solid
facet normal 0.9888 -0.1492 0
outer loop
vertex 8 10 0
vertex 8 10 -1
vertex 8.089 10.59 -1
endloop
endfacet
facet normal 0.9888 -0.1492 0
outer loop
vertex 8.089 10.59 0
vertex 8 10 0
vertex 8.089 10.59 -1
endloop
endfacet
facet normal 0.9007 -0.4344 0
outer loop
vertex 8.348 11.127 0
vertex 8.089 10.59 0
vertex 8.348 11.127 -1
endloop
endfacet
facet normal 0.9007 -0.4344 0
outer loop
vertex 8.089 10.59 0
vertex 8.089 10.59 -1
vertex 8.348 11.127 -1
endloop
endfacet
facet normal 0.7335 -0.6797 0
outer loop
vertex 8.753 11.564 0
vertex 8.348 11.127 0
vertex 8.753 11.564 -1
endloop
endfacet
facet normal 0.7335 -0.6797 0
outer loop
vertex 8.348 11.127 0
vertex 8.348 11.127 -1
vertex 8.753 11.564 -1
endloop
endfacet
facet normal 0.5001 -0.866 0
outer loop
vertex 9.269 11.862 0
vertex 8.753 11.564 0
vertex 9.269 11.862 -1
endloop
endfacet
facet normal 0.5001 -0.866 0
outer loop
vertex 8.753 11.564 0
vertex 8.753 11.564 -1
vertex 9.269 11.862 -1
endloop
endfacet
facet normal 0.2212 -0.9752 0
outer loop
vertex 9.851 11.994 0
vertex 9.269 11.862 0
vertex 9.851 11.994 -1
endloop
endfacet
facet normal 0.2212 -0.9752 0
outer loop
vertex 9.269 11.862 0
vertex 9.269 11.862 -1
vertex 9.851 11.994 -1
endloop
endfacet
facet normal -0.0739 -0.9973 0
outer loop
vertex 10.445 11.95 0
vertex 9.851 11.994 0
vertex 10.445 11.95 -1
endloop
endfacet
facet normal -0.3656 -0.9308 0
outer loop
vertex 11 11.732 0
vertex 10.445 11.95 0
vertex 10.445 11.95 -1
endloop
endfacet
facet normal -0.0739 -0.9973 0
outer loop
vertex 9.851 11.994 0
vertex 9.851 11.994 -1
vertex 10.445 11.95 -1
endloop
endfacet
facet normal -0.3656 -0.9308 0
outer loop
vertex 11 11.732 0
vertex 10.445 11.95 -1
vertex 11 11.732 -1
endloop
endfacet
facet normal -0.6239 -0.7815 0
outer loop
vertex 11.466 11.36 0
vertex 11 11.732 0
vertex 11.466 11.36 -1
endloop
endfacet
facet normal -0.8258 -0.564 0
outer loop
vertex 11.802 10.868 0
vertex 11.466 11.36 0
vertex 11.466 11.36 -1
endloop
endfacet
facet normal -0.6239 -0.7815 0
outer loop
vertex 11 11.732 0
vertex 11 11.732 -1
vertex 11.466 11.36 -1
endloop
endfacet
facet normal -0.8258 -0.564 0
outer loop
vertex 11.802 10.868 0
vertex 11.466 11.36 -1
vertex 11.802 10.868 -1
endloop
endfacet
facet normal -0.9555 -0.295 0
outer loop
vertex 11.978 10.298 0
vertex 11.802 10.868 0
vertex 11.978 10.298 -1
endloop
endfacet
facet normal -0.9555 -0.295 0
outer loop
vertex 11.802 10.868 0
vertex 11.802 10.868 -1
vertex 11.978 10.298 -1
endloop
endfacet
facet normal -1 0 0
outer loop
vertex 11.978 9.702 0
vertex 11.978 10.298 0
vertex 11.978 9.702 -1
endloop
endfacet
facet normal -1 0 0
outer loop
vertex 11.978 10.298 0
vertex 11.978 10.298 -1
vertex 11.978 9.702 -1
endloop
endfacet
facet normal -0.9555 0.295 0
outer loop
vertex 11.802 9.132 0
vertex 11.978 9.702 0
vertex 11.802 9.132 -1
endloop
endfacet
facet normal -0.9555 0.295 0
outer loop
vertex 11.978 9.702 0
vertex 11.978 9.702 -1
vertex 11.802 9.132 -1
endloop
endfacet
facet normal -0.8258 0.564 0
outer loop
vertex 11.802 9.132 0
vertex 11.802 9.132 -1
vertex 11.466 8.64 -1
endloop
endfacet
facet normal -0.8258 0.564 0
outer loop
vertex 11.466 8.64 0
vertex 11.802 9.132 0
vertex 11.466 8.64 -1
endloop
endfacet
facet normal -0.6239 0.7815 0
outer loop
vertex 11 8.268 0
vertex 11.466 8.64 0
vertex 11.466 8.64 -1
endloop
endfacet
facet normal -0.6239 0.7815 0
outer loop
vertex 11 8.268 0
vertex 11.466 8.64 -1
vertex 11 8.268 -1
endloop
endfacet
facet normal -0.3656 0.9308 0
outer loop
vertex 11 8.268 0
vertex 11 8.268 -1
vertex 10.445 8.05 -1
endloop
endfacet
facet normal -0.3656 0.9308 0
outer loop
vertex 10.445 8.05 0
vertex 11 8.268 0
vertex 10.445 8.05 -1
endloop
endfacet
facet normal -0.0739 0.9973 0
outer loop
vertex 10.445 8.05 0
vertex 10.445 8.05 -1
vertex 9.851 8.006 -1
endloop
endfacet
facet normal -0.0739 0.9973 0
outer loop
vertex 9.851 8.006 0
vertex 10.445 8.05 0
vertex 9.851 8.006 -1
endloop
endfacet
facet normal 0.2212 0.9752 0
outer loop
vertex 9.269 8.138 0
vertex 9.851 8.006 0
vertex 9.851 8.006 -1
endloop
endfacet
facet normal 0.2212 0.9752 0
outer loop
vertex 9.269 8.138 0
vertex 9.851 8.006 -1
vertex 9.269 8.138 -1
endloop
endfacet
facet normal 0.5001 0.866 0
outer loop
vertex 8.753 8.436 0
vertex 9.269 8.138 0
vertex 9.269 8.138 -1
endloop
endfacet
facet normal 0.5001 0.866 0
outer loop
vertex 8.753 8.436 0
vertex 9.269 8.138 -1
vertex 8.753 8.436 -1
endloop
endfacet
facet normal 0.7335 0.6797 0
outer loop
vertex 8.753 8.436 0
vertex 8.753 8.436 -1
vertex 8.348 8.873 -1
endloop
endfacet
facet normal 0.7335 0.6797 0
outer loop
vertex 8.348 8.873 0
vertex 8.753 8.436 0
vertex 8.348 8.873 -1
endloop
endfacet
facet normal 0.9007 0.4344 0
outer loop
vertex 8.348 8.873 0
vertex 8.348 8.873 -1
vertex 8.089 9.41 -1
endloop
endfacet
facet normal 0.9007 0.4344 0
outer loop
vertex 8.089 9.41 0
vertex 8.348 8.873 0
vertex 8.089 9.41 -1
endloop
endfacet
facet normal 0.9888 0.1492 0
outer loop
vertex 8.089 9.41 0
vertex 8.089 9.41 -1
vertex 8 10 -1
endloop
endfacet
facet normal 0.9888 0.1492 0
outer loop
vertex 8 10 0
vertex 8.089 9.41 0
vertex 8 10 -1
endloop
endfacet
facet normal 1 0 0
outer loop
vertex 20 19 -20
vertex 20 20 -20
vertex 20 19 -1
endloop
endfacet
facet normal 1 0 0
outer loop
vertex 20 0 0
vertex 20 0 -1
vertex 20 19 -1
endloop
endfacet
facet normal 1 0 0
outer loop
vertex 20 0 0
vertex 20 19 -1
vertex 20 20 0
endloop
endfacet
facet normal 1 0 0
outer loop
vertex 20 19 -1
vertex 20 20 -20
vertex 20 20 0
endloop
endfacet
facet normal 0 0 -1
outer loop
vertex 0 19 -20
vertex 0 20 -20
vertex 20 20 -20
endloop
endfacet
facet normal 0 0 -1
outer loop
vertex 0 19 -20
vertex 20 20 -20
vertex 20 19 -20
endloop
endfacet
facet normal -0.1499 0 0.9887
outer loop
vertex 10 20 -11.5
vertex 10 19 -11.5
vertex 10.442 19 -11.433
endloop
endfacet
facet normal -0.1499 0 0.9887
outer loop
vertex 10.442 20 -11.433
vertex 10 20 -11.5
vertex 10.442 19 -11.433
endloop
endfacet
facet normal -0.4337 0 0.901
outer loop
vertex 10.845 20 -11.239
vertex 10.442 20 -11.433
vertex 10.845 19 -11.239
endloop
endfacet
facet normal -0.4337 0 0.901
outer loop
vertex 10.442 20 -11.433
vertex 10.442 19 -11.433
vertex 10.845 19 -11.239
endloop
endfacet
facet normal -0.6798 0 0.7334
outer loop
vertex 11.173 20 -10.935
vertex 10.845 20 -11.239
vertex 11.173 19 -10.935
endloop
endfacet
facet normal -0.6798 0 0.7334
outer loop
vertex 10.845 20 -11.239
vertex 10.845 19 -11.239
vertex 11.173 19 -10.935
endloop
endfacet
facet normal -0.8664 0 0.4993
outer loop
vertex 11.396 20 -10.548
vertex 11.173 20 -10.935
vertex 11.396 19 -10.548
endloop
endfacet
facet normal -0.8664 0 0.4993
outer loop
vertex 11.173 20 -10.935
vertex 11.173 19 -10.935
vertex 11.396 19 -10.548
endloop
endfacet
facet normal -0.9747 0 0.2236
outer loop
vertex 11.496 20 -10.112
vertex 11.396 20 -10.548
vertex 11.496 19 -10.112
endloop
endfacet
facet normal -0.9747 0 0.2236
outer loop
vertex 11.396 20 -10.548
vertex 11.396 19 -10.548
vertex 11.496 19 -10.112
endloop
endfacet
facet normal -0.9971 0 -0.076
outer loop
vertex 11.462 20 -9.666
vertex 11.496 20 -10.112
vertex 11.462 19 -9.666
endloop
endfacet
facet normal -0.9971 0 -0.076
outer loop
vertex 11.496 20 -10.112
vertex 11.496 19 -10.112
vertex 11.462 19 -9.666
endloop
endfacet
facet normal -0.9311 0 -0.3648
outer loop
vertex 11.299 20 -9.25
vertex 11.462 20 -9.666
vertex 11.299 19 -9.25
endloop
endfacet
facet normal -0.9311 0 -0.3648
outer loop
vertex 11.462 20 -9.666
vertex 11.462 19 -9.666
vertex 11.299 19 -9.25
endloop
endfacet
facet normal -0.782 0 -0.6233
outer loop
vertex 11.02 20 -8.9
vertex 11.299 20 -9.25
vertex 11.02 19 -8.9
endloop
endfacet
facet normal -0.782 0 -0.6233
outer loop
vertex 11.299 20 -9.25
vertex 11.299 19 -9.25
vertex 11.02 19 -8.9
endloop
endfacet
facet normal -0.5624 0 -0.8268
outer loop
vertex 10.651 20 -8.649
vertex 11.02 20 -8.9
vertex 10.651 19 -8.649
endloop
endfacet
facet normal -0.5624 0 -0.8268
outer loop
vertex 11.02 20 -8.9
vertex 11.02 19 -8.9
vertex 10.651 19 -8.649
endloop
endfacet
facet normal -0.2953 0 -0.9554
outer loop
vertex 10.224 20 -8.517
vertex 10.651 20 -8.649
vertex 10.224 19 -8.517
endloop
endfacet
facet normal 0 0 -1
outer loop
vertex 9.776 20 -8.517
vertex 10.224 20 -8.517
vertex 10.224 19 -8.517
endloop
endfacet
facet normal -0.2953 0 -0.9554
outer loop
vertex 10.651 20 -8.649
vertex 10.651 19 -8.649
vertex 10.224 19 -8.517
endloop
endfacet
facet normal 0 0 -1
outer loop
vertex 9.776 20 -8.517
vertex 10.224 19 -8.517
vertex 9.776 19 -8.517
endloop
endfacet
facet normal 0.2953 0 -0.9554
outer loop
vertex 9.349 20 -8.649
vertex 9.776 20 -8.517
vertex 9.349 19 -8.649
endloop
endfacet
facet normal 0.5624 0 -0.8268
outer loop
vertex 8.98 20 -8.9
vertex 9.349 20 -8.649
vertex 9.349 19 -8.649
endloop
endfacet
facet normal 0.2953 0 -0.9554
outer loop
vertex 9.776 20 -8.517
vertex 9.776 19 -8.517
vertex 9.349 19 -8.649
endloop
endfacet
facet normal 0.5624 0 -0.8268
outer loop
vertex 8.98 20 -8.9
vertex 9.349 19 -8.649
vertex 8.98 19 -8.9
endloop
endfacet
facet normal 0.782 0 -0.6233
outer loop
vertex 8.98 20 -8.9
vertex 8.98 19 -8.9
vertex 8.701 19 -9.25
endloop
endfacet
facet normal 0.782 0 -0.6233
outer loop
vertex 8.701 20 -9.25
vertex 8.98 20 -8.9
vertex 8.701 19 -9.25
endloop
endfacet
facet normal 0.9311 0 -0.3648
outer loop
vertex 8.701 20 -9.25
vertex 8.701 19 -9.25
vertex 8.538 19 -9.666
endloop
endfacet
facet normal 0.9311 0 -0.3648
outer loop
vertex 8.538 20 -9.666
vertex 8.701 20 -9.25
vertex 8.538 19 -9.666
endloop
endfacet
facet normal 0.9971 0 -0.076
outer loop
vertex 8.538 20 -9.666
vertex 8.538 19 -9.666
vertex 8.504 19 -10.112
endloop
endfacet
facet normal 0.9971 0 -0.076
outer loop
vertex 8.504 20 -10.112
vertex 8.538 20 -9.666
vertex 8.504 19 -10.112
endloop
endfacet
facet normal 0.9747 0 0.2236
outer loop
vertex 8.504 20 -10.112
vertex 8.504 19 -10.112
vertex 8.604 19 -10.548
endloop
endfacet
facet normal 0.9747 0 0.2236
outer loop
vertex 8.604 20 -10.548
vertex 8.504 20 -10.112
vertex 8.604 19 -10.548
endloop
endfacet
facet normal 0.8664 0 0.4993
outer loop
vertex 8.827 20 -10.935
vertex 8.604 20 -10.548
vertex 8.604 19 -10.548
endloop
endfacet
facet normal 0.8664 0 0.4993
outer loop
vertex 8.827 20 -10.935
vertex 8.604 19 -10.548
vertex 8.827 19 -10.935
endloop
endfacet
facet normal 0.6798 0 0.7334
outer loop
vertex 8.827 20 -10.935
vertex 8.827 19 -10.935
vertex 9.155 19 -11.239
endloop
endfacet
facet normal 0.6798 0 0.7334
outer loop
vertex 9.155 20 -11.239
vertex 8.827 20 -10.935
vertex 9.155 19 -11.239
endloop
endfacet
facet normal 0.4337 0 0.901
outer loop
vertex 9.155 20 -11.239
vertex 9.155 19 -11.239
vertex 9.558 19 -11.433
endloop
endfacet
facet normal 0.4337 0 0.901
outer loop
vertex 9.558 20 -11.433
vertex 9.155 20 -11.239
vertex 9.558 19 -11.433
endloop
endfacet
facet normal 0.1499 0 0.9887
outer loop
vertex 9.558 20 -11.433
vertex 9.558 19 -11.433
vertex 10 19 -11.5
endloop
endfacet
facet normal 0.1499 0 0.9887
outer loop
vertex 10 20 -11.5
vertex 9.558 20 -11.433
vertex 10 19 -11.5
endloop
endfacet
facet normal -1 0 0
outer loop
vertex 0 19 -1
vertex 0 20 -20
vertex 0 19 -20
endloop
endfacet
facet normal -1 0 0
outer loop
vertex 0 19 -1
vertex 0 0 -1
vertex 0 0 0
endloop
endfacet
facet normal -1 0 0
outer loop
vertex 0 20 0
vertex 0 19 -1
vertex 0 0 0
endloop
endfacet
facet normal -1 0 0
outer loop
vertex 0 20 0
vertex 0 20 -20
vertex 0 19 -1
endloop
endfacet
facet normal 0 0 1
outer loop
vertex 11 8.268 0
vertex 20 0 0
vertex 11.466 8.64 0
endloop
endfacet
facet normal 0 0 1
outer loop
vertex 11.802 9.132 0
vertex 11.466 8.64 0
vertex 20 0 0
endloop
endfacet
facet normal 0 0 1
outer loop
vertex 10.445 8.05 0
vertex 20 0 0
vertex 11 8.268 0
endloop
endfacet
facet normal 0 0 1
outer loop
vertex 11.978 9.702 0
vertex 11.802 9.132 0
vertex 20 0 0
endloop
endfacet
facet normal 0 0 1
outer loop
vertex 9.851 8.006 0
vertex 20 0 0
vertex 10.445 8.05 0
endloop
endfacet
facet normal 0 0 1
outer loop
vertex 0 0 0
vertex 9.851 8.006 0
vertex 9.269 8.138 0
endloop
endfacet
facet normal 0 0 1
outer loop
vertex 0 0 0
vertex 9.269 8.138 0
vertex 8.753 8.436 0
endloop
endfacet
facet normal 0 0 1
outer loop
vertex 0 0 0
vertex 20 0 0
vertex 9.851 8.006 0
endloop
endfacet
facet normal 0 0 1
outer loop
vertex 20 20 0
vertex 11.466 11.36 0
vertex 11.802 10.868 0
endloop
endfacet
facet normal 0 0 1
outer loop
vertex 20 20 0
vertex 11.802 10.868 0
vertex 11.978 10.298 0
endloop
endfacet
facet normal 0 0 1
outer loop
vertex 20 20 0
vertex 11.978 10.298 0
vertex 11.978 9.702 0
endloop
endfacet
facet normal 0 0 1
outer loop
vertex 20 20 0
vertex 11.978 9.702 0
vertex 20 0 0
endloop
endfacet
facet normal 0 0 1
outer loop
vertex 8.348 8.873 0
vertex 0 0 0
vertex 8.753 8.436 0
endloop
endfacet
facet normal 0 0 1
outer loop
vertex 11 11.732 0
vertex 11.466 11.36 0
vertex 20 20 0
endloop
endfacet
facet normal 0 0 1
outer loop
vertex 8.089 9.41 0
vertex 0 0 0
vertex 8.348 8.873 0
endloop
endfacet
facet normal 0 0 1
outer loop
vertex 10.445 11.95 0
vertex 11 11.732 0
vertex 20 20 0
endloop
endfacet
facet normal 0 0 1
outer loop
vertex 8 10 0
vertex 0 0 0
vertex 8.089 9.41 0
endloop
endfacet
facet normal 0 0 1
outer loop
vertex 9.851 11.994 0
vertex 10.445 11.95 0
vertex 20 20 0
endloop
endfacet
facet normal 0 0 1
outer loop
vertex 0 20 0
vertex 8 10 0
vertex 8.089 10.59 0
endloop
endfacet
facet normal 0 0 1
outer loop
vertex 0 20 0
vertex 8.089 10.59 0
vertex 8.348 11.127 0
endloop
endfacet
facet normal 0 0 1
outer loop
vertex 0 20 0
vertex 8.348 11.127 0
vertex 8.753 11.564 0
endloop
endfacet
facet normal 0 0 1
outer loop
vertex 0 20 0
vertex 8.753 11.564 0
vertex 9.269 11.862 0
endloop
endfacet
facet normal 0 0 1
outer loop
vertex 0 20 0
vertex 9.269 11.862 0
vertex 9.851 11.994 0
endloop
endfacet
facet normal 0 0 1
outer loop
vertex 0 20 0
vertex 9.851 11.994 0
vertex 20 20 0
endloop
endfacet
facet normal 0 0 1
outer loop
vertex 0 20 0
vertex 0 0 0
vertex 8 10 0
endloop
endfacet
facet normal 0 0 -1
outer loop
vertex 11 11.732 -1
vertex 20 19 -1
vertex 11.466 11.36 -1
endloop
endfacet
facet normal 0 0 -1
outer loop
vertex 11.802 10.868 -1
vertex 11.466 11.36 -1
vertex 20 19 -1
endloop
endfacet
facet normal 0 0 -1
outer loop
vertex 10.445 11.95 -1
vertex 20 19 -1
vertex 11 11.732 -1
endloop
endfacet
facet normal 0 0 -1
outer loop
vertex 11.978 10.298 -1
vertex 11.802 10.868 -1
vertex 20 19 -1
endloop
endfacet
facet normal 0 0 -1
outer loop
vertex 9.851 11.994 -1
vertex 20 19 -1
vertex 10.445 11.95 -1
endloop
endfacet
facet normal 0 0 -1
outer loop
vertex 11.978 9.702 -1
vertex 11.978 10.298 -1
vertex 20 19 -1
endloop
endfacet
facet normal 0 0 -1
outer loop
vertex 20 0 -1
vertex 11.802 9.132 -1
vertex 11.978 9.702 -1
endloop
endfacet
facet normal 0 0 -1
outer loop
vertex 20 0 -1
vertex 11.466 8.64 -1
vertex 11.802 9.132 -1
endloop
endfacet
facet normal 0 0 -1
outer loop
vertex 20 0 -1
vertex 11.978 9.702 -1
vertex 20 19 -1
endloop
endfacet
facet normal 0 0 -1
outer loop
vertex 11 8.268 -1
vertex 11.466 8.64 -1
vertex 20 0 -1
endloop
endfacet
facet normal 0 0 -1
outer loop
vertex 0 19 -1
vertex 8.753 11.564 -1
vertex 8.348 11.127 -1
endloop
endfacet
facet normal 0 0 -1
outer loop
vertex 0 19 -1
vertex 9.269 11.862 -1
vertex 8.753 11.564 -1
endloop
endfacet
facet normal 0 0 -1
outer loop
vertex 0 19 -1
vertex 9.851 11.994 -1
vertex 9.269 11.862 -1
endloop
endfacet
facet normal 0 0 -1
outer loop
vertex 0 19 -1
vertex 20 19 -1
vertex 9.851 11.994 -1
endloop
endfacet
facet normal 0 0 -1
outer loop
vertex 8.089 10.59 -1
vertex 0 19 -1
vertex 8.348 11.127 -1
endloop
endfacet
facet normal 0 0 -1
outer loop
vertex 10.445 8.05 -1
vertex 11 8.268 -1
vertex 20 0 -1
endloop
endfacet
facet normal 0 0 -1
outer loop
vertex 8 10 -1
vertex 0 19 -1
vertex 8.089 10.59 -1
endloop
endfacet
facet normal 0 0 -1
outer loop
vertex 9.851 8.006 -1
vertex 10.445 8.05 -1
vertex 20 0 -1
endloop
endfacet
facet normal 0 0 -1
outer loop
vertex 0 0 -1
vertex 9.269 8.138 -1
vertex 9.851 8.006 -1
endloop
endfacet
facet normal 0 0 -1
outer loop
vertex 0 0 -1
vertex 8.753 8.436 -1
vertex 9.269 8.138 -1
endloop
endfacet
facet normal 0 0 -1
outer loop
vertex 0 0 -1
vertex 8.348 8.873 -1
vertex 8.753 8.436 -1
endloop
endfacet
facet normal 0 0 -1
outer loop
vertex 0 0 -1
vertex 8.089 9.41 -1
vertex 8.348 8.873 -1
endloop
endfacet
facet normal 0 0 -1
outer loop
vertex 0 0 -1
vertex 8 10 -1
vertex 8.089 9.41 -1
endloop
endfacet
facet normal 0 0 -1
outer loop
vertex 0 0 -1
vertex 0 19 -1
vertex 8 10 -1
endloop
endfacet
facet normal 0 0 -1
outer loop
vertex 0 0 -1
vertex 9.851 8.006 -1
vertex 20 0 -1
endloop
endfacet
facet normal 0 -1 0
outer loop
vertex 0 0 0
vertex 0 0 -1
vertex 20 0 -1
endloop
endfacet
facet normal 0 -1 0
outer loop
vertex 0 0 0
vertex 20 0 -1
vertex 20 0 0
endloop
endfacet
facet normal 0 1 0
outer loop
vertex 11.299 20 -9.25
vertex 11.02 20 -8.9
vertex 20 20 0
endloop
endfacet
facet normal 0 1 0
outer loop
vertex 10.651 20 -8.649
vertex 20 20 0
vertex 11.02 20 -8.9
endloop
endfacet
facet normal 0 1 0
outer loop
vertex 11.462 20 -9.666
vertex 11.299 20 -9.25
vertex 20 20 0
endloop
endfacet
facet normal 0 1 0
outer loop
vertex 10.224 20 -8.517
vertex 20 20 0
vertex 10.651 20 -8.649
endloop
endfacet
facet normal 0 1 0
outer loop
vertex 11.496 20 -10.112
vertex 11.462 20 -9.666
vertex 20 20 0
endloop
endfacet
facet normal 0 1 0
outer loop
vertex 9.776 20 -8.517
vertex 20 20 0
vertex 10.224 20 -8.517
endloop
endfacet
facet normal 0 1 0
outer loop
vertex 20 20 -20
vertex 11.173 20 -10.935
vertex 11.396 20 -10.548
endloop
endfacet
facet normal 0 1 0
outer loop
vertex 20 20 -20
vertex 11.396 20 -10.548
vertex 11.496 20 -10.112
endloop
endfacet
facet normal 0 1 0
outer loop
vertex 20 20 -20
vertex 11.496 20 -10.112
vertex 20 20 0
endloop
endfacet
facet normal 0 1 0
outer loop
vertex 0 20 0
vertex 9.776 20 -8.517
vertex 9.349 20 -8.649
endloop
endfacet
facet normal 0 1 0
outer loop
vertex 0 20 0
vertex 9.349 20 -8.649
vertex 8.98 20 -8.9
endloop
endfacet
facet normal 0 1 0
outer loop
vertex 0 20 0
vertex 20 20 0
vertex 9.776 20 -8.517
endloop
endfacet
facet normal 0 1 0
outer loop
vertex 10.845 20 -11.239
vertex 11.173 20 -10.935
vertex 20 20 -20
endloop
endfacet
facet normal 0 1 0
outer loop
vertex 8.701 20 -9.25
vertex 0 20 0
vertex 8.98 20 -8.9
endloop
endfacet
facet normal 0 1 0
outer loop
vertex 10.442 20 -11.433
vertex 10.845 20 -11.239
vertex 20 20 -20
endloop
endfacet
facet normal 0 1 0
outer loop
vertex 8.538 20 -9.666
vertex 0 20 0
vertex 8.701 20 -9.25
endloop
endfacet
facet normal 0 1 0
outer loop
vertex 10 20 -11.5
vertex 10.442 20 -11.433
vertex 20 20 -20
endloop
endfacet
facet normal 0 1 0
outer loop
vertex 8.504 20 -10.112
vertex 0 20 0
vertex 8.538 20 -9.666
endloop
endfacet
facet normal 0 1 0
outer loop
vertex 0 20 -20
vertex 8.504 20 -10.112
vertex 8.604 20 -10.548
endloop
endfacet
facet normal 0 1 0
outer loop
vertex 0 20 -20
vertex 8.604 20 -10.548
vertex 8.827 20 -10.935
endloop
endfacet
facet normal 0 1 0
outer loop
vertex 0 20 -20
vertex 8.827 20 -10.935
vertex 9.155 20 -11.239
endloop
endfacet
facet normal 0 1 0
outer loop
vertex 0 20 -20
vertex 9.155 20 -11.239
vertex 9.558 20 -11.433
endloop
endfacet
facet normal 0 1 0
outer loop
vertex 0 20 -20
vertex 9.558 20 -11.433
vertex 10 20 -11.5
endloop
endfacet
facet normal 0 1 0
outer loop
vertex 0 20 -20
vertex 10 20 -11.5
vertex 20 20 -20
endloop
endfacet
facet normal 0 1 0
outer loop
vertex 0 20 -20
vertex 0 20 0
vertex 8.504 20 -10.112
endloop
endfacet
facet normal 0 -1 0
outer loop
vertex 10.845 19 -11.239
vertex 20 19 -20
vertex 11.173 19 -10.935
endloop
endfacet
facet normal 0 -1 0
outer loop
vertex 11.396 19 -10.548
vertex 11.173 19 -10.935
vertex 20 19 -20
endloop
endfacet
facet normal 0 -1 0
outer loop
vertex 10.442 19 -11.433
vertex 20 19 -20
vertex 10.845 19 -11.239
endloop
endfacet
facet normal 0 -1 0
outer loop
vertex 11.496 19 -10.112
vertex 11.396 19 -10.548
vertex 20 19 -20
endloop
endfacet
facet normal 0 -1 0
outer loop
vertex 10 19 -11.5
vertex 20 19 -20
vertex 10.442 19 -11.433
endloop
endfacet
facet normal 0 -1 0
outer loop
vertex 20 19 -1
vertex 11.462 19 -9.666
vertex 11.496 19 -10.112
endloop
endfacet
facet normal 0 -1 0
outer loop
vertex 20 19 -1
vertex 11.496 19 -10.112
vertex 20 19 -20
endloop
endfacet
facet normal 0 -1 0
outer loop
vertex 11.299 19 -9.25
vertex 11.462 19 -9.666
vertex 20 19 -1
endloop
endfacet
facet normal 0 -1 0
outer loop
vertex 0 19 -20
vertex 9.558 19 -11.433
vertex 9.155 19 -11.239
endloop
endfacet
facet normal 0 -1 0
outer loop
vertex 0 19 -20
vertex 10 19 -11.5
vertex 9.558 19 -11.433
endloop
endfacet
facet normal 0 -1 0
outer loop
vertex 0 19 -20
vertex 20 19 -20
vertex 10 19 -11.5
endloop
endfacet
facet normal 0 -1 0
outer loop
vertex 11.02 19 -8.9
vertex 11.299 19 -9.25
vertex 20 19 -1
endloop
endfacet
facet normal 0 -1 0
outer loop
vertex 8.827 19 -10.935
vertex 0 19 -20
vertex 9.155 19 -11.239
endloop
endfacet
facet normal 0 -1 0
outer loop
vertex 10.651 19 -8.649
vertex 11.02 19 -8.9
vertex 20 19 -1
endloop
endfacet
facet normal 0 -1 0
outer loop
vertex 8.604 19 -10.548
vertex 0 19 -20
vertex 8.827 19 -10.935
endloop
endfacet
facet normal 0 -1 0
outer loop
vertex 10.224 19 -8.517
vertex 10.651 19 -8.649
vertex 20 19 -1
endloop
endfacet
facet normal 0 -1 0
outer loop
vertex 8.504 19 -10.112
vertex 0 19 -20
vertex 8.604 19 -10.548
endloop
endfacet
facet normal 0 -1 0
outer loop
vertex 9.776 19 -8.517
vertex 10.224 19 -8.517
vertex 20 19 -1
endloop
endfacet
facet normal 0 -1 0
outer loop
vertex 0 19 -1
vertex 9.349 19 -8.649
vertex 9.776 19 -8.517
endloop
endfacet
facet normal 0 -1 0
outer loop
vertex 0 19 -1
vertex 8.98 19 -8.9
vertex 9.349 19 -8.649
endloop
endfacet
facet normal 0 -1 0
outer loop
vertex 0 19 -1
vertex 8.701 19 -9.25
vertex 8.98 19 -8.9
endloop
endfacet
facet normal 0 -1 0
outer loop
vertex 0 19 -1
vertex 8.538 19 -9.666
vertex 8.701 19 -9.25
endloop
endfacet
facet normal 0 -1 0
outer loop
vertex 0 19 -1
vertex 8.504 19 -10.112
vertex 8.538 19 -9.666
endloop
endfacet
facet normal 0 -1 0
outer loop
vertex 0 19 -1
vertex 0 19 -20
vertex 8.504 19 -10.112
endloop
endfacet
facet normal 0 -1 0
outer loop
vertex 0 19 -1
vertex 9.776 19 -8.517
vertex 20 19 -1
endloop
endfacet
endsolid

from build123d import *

# Parameters (mm, degrees)
EXTRUDE_1_DEPTH     = 20
SKETCH_2_R          = 2
CUT_EXTRUDE_1_DEPTH = 35.073450075
SKETCH_3_R          = 1.5
CUT_EXTRUDE_2_DEPTH = 35.073450075


with BuildPart() as part:
    # 草图1 → 凸台-拉伸1 (new body)
    with BuildSketch(Plane(origin=(0, 0, 0), x_dir=(0, 0, -1), z_dir=(1, 0, 0))):
        Polygon((0, 0), (0, 20), (20, 20), (20, 19), (1, 19), (1, 0), align=None)
    extrude(amount=EXTRUDE_1_DEPTH)

    # 草图2 → 切除-拉伸1 (cut, through all)
    with BuildSketch(Plane(origin=(0, 0, -1), x_dir=(-1, 0, 0), z_dir=(0, 0, -1))):
        with Locations((-10, 10)):
            Circle(SKETCH_2_R)
    extrude(amount=-CUT_EXTRUDE_1_DEPTH, mode=Mode.SUBTRACT)

    # 草图3 → 切除-拉伸2 (cut, through all)
    with BuildSketch(Plane.XZ.offset(-19)):
        with Locations(Location((10, -10, 0), (0, 0, 270))):
            Circle(SKETCH_3_R)
    extrude(amount=-CUT_EXTRUDE_2_DEPTH, mode=Mode.SUBTRACT)


solid = part.part
